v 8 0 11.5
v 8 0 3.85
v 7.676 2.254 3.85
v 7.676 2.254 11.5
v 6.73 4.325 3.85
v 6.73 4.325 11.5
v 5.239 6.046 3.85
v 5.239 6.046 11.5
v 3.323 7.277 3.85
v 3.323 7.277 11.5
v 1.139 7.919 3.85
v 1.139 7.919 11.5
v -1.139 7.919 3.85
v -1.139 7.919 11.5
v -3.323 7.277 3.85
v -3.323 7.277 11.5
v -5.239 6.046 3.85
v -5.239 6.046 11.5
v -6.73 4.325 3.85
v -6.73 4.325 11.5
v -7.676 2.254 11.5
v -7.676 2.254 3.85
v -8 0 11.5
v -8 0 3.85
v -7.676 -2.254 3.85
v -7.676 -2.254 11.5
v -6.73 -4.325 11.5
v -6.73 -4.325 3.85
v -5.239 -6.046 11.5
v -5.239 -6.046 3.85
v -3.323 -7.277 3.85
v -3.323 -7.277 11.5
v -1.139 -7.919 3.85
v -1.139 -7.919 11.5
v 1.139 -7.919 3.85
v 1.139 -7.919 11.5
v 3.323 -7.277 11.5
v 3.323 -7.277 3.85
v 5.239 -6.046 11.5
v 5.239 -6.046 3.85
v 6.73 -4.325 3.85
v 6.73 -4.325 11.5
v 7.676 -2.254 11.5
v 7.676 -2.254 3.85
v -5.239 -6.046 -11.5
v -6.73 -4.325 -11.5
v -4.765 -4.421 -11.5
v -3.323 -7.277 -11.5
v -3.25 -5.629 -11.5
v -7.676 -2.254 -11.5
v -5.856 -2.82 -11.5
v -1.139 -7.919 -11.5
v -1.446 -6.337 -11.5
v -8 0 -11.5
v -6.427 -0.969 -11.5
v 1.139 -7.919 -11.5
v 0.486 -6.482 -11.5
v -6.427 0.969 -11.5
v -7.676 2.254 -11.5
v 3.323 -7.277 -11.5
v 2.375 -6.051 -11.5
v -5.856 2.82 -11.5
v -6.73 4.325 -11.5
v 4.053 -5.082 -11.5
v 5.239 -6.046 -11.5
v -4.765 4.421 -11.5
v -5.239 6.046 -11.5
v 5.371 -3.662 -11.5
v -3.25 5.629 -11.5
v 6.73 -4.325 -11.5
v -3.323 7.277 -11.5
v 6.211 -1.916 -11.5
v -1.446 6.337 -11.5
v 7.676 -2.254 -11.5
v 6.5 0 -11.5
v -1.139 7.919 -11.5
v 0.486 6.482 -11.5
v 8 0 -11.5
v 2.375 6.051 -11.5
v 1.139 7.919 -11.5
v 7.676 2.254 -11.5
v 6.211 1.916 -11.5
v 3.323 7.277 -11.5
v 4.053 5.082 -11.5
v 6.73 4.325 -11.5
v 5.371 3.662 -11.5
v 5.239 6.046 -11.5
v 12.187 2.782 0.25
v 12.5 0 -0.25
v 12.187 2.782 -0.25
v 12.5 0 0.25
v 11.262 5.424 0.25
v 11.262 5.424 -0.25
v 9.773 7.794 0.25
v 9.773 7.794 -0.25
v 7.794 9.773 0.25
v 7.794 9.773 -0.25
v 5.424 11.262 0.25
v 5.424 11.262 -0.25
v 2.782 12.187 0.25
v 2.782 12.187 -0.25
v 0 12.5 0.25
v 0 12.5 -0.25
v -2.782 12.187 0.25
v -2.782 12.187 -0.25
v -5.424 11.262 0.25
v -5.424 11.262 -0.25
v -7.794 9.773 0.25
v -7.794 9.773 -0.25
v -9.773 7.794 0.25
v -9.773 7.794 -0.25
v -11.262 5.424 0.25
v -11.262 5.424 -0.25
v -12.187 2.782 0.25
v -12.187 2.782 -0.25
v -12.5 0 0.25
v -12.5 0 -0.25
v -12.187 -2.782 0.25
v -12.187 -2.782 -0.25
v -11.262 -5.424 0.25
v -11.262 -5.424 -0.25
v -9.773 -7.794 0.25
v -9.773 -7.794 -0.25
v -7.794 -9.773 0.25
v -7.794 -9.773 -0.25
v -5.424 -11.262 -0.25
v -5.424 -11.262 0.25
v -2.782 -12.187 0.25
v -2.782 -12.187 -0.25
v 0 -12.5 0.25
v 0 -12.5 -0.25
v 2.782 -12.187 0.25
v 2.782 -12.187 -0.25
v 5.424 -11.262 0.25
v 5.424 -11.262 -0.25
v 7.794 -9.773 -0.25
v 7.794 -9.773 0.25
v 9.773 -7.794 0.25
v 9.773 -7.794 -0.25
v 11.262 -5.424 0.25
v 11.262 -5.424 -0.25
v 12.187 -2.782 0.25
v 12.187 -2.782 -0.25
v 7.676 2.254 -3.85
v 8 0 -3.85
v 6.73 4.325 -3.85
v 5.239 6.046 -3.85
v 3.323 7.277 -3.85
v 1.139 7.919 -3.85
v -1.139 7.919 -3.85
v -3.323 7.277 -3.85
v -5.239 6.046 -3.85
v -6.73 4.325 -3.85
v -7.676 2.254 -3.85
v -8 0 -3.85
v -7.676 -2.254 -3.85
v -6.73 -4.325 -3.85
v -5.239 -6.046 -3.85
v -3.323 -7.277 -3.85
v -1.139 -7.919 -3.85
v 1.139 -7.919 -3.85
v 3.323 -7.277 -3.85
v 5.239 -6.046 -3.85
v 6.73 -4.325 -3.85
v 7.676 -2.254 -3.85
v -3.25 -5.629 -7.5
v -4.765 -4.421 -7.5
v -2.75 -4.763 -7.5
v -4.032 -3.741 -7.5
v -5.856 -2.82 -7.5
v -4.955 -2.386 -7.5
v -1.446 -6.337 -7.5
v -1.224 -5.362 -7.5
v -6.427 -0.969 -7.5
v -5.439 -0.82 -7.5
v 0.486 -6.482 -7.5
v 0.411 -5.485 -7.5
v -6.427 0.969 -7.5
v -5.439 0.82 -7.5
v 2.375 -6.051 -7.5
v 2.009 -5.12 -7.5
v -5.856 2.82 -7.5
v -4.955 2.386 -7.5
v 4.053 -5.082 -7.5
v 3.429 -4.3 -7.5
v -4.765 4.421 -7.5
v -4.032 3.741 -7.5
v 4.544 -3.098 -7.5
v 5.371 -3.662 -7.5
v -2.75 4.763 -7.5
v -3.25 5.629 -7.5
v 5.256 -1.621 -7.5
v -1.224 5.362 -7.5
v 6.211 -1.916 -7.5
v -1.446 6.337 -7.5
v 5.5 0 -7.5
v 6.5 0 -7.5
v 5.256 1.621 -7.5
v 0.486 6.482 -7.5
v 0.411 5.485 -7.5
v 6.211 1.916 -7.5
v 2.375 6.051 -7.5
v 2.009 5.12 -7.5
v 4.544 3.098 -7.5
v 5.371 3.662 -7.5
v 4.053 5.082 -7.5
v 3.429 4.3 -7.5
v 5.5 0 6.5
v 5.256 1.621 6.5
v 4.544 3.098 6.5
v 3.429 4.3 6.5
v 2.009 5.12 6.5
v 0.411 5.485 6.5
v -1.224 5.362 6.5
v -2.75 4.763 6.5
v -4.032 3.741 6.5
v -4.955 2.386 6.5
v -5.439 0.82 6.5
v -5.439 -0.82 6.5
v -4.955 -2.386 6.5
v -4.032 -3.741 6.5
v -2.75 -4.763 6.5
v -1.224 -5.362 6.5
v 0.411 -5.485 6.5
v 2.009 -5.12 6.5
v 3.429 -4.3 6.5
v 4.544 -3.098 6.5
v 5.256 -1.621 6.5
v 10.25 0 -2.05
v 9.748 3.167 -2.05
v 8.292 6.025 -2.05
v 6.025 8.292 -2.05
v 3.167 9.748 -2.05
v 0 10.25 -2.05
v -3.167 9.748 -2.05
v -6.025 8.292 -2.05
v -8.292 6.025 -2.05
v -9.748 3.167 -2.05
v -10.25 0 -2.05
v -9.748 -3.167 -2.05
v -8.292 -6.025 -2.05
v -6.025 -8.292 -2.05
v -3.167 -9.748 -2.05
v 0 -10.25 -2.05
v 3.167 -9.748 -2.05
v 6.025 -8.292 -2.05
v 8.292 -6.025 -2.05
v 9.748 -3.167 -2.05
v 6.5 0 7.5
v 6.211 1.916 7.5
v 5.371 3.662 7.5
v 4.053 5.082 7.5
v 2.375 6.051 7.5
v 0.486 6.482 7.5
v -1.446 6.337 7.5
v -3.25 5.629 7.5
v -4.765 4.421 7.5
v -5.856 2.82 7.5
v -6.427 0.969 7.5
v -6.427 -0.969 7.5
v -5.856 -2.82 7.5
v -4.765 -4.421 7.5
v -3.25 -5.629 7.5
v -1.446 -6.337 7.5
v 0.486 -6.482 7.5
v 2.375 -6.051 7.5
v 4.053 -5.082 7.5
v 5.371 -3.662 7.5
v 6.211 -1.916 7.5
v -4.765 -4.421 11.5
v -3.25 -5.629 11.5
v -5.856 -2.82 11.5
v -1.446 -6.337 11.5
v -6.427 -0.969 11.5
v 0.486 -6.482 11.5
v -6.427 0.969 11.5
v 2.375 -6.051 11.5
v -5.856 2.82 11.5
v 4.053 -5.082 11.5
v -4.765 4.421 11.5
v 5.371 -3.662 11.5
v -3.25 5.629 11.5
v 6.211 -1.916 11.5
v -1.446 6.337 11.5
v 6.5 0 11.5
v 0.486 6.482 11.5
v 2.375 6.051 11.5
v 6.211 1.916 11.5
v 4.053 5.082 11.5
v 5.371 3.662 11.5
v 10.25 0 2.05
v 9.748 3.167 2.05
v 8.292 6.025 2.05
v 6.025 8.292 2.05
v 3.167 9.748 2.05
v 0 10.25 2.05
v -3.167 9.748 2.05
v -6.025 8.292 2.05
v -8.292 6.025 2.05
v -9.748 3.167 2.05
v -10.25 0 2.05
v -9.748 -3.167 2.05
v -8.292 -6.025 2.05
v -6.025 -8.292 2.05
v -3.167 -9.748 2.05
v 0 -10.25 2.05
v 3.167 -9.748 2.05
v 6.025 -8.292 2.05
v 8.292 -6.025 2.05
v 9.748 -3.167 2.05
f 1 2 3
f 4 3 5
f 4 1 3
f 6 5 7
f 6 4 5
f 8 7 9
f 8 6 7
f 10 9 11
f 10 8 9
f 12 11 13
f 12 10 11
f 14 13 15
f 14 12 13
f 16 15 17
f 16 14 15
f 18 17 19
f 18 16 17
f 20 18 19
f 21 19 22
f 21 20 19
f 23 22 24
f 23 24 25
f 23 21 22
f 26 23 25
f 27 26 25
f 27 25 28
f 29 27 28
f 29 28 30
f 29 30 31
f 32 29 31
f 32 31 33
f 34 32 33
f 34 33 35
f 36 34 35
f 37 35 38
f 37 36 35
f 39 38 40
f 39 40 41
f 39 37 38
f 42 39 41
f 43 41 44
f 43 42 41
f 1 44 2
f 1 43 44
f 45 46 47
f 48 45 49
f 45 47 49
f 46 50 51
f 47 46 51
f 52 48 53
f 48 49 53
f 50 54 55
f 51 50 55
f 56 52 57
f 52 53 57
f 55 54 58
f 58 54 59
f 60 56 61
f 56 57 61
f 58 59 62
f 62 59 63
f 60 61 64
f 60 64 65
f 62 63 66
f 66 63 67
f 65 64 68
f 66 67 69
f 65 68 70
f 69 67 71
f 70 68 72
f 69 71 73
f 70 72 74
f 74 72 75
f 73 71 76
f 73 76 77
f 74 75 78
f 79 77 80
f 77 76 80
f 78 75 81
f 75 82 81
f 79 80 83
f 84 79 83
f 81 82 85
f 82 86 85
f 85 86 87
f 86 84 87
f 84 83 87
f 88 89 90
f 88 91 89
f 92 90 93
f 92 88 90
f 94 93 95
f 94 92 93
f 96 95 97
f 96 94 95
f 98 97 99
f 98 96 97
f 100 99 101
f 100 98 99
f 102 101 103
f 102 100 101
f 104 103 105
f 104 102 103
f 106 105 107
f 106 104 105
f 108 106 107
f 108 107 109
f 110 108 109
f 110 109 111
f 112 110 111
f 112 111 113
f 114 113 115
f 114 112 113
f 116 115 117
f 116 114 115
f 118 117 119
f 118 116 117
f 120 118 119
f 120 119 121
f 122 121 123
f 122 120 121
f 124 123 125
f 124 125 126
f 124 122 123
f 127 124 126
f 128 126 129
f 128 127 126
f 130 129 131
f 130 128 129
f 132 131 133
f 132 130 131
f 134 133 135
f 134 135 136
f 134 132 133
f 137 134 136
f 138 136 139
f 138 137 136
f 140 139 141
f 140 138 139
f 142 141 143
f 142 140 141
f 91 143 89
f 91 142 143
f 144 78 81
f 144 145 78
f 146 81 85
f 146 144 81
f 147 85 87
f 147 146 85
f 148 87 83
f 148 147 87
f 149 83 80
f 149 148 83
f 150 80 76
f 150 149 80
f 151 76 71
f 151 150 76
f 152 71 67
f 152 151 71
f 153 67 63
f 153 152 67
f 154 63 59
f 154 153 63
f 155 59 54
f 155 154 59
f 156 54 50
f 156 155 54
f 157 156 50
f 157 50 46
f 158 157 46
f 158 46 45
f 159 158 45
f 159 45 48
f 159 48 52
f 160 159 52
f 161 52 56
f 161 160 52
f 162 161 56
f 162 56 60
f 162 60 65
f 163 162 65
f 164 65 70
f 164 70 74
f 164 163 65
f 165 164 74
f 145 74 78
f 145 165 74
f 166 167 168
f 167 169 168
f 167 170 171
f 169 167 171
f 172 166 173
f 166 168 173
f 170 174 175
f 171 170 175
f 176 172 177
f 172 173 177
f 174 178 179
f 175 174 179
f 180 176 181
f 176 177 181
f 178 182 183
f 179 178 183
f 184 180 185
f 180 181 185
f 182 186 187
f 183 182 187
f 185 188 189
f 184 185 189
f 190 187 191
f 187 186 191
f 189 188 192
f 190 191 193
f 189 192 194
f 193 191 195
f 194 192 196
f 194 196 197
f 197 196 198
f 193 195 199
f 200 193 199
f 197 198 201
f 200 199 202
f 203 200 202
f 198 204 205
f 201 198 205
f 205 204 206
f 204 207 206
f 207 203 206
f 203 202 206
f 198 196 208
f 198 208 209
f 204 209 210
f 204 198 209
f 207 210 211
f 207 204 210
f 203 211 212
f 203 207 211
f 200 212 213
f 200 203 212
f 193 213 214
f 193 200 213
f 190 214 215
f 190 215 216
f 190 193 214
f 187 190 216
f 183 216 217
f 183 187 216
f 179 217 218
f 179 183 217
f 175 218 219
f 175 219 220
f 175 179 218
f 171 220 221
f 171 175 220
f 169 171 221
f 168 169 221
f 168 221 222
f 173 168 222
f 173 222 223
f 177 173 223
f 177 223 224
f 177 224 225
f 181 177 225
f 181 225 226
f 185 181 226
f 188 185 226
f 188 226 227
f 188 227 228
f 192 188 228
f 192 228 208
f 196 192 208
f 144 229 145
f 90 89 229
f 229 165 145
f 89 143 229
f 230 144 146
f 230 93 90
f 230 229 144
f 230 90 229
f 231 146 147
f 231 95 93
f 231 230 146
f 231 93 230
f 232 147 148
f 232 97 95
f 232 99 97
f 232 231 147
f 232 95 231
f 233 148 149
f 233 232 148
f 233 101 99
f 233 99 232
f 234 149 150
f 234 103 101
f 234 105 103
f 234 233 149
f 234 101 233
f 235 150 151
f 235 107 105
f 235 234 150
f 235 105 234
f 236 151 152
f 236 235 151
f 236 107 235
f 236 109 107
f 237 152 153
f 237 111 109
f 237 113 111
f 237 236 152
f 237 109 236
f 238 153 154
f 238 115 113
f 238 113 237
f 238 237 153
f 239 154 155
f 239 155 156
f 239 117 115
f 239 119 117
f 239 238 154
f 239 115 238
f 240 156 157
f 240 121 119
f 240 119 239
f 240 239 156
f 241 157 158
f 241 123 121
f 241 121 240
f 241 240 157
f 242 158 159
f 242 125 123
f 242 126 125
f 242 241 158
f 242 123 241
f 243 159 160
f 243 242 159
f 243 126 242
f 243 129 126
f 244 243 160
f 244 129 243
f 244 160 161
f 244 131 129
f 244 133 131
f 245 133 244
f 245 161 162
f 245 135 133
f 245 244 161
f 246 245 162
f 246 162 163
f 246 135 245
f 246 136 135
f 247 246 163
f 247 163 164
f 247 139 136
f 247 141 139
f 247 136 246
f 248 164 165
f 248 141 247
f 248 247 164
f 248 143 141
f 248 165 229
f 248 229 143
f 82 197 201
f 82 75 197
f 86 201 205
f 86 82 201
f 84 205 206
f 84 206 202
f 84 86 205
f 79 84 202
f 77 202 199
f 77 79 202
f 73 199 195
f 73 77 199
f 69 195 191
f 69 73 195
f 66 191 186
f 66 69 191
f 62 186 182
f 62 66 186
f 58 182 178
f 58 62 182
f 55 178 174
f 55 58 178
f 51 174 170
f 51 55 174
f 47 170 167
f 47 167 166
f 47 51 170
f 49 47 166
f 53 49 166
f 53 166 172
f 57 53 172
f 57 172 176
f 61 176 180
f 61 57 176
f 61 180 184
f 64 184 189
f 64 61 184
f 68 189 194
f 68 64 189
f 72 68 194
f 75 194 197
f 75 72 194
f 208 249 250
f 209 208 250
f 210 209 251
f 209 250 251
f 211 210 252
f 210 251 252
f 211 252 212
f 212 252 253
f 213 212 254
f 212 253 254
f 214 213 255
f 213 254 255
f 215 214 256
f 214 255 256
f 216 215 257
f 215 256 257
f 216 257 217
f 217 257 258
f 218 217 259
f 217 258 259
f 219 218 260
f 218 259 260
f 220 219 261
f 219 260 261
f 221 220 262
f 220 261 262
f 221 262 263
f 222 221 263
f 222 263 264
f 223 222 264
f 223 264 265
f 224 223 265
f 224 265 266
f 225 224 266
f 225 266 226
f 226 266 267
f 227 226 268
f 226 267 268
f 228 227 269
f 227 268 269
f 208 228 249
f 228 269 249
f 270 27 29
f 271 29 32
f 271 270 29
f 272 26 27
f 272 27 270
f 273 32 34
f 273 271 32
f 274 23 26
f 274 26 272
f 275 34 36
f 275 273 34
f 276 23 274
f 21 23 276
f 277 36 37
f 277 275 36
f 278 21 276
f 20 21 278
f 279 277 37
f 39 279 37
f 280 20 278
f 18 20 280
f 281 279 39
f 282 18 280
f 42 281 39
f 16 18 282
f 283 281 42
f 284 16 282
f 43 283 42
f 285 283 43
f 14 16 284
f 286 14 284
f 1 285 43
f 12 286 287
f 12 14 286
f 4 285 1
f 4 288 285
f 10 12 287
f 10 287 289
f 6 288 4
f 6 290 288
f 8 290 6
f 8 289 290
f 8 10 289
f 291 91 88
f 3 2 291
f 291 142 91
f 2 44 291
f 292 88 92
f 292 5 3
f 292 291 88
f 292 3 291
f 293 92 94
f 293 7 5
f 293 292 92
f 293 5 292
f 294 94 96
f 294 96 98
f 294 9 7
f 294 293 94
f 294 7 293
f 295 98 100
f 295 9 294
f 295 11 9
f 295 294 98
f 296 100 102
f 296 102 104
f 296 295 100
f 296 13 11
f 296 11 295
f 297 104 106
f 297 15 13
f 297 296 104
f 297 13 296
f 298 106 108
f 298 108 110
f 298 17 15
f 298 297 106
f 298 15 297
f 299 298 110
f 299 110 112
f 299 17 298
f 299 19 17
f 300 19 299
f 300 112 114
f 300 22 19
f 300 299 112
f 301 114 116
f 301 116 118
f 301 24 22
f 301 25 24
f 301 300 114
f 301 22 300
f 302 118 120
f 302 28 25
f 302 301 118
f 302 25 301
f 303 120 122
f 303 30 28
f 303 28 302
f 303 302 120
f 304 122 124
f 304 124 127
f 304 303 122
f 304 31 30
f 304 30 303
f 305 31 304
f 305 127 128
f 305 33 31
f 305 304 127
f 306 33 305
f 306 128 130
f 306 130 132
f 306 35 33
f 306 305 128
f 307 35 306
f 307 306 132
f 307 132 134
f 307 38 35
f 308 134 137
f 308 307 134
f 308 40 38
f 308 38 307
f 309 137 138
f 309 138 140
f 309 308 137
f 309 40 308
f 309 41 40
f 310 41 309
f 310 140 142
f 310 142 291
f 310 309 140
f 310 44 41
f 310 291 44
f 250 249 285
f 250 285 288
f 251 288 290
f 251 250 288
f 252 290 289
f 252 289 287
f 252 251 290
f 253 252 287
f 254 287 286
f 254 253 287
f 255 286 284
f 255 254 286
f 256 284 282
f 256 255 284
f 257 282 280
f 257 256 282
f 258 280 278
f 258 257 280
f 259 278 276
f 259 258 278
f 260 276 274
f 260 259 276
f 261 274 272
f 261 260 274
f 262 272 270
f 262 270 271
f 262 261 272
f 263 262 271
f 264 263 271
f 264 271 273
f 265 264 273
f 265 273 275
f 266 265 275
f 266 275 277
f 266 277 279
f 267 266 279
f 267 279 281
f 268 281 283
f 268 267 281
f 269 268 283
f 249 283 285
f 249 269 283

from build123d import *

# Parameters (mm, degrees)
F0_R         = 8
F0_R_2       = 6.5
F1_DEPTH     = 11.5
F0_R_3       = 12.5
F2_DEPTH     = 4.25
F3_S5_R      = 8
F3_T6_DEPTH  = 19
F3_S11_R     = 8
F3_T12_DEPTH = 19
F0_R_4       = 5.5
F5_DEPTH     = 7.5
F6_SIZE      = 0.99999


# Not quite as in the source:
# - a fillet or chamfer that OpenCascade refuses, or shapes differently, is made with other operations: its cross-section is extruded or revolved along the edge and cut away or added
# - two fillets or chamfers of one size are made in one step
# - a fillet or chamfer is up to 0.001 mm smaller than in the source, because OpenCascade refuses the exact size


with BuildPart() as f1:
    # F0 (on Top) → F1 (new body, symmetric)
    with BuildSketch(Plane.XY):
        Circle(F0_R)
        Circle(F0_R_2, mode=Mode.SUBTRACT)
    extrude(amount=F1_DEPTH, both=True)

    # F0 (on Top) → F2 (join, symmetric)
    with BuildSketch(Plane.XY):
        Circle(F0_R_3)
        Circle(F0_R, mode=Mode.SUBTRACT)
    extrude(amount=F2_DEPTH, both=True)

    # F3: chamfer of 5 x 4 on 2 edges, made by hand


with BuildPart() as f3_tool2:
    # F3_s3 → F3_t4 (revolve)
    with BuildSketch(Plane.XZ):
        Polygon((12.5, 0.25), (7.5, 4.25), (12.5, 4.25), align=None)
    revolve(axis=Axis((0, 0, 4.25), (0, 0, 1)))

    # F3_s5 → F3_t6 (cut, symmetric)
    with BuildSketch(Plane.XY.offset(2.2)):
        Circle(F3_S5_R)
    extrude(amount=F3_T6_DEPTH, both=True, mode=Mode.SUBTRACT)


with BuildPart() as f1_1:
    add(f1.part)

    # F3_t1: cut F3_tool2
    add(f3_tool2.part, mode=Mode.SUBTRACT)


with BuildPart() as f3_tool8:
    # F3_s9 → F3_t10 (revolve)
    with BuildSketch(Plane.XZ):
        Polygon((7.5, -4.25), (12.5, -0.25), (12.5, -4.25), align=None)
    revolve(axis=Axis((0, 0, -4.25), (0, 0, 1)))

    # F3_s11 → F3_t12 (cut, symmetric)
    with BuildSketch(Plane.XY.offset(-2.2)):
        Circle(F3_S11_R)
    extrude(amount=F3_T12_DEPTH, both=True, mode=Mode.SUBTRACT)


with BuildPart() as f1_2:
    add(f1_1.part)

    # F3_t7: cut F3_tool8
    add(f3_tool8.part, mode=Mode.SUBTRACT)

    # F0 (on Top) → F5 (join, symmetric)
    with BuildSketch(Plane.XY):
        Circle(F0_R_2)
        Circle(F0_R_4, mode=Mode.SUBTRACT)
    extrude(amount=F5_DEPTH, both=True)

    # F6 (size 1 in the source; OpenCascade refuses exactly that, so slightly less here)
    f6_edges = [f1_2.edges().sort_by_distance(p)[0] for p in [
        (-5.5, 0, 7.5),
    ]]
    chamfer(f6_edges, length=F6_SIZE)


solid = f1_2.part
